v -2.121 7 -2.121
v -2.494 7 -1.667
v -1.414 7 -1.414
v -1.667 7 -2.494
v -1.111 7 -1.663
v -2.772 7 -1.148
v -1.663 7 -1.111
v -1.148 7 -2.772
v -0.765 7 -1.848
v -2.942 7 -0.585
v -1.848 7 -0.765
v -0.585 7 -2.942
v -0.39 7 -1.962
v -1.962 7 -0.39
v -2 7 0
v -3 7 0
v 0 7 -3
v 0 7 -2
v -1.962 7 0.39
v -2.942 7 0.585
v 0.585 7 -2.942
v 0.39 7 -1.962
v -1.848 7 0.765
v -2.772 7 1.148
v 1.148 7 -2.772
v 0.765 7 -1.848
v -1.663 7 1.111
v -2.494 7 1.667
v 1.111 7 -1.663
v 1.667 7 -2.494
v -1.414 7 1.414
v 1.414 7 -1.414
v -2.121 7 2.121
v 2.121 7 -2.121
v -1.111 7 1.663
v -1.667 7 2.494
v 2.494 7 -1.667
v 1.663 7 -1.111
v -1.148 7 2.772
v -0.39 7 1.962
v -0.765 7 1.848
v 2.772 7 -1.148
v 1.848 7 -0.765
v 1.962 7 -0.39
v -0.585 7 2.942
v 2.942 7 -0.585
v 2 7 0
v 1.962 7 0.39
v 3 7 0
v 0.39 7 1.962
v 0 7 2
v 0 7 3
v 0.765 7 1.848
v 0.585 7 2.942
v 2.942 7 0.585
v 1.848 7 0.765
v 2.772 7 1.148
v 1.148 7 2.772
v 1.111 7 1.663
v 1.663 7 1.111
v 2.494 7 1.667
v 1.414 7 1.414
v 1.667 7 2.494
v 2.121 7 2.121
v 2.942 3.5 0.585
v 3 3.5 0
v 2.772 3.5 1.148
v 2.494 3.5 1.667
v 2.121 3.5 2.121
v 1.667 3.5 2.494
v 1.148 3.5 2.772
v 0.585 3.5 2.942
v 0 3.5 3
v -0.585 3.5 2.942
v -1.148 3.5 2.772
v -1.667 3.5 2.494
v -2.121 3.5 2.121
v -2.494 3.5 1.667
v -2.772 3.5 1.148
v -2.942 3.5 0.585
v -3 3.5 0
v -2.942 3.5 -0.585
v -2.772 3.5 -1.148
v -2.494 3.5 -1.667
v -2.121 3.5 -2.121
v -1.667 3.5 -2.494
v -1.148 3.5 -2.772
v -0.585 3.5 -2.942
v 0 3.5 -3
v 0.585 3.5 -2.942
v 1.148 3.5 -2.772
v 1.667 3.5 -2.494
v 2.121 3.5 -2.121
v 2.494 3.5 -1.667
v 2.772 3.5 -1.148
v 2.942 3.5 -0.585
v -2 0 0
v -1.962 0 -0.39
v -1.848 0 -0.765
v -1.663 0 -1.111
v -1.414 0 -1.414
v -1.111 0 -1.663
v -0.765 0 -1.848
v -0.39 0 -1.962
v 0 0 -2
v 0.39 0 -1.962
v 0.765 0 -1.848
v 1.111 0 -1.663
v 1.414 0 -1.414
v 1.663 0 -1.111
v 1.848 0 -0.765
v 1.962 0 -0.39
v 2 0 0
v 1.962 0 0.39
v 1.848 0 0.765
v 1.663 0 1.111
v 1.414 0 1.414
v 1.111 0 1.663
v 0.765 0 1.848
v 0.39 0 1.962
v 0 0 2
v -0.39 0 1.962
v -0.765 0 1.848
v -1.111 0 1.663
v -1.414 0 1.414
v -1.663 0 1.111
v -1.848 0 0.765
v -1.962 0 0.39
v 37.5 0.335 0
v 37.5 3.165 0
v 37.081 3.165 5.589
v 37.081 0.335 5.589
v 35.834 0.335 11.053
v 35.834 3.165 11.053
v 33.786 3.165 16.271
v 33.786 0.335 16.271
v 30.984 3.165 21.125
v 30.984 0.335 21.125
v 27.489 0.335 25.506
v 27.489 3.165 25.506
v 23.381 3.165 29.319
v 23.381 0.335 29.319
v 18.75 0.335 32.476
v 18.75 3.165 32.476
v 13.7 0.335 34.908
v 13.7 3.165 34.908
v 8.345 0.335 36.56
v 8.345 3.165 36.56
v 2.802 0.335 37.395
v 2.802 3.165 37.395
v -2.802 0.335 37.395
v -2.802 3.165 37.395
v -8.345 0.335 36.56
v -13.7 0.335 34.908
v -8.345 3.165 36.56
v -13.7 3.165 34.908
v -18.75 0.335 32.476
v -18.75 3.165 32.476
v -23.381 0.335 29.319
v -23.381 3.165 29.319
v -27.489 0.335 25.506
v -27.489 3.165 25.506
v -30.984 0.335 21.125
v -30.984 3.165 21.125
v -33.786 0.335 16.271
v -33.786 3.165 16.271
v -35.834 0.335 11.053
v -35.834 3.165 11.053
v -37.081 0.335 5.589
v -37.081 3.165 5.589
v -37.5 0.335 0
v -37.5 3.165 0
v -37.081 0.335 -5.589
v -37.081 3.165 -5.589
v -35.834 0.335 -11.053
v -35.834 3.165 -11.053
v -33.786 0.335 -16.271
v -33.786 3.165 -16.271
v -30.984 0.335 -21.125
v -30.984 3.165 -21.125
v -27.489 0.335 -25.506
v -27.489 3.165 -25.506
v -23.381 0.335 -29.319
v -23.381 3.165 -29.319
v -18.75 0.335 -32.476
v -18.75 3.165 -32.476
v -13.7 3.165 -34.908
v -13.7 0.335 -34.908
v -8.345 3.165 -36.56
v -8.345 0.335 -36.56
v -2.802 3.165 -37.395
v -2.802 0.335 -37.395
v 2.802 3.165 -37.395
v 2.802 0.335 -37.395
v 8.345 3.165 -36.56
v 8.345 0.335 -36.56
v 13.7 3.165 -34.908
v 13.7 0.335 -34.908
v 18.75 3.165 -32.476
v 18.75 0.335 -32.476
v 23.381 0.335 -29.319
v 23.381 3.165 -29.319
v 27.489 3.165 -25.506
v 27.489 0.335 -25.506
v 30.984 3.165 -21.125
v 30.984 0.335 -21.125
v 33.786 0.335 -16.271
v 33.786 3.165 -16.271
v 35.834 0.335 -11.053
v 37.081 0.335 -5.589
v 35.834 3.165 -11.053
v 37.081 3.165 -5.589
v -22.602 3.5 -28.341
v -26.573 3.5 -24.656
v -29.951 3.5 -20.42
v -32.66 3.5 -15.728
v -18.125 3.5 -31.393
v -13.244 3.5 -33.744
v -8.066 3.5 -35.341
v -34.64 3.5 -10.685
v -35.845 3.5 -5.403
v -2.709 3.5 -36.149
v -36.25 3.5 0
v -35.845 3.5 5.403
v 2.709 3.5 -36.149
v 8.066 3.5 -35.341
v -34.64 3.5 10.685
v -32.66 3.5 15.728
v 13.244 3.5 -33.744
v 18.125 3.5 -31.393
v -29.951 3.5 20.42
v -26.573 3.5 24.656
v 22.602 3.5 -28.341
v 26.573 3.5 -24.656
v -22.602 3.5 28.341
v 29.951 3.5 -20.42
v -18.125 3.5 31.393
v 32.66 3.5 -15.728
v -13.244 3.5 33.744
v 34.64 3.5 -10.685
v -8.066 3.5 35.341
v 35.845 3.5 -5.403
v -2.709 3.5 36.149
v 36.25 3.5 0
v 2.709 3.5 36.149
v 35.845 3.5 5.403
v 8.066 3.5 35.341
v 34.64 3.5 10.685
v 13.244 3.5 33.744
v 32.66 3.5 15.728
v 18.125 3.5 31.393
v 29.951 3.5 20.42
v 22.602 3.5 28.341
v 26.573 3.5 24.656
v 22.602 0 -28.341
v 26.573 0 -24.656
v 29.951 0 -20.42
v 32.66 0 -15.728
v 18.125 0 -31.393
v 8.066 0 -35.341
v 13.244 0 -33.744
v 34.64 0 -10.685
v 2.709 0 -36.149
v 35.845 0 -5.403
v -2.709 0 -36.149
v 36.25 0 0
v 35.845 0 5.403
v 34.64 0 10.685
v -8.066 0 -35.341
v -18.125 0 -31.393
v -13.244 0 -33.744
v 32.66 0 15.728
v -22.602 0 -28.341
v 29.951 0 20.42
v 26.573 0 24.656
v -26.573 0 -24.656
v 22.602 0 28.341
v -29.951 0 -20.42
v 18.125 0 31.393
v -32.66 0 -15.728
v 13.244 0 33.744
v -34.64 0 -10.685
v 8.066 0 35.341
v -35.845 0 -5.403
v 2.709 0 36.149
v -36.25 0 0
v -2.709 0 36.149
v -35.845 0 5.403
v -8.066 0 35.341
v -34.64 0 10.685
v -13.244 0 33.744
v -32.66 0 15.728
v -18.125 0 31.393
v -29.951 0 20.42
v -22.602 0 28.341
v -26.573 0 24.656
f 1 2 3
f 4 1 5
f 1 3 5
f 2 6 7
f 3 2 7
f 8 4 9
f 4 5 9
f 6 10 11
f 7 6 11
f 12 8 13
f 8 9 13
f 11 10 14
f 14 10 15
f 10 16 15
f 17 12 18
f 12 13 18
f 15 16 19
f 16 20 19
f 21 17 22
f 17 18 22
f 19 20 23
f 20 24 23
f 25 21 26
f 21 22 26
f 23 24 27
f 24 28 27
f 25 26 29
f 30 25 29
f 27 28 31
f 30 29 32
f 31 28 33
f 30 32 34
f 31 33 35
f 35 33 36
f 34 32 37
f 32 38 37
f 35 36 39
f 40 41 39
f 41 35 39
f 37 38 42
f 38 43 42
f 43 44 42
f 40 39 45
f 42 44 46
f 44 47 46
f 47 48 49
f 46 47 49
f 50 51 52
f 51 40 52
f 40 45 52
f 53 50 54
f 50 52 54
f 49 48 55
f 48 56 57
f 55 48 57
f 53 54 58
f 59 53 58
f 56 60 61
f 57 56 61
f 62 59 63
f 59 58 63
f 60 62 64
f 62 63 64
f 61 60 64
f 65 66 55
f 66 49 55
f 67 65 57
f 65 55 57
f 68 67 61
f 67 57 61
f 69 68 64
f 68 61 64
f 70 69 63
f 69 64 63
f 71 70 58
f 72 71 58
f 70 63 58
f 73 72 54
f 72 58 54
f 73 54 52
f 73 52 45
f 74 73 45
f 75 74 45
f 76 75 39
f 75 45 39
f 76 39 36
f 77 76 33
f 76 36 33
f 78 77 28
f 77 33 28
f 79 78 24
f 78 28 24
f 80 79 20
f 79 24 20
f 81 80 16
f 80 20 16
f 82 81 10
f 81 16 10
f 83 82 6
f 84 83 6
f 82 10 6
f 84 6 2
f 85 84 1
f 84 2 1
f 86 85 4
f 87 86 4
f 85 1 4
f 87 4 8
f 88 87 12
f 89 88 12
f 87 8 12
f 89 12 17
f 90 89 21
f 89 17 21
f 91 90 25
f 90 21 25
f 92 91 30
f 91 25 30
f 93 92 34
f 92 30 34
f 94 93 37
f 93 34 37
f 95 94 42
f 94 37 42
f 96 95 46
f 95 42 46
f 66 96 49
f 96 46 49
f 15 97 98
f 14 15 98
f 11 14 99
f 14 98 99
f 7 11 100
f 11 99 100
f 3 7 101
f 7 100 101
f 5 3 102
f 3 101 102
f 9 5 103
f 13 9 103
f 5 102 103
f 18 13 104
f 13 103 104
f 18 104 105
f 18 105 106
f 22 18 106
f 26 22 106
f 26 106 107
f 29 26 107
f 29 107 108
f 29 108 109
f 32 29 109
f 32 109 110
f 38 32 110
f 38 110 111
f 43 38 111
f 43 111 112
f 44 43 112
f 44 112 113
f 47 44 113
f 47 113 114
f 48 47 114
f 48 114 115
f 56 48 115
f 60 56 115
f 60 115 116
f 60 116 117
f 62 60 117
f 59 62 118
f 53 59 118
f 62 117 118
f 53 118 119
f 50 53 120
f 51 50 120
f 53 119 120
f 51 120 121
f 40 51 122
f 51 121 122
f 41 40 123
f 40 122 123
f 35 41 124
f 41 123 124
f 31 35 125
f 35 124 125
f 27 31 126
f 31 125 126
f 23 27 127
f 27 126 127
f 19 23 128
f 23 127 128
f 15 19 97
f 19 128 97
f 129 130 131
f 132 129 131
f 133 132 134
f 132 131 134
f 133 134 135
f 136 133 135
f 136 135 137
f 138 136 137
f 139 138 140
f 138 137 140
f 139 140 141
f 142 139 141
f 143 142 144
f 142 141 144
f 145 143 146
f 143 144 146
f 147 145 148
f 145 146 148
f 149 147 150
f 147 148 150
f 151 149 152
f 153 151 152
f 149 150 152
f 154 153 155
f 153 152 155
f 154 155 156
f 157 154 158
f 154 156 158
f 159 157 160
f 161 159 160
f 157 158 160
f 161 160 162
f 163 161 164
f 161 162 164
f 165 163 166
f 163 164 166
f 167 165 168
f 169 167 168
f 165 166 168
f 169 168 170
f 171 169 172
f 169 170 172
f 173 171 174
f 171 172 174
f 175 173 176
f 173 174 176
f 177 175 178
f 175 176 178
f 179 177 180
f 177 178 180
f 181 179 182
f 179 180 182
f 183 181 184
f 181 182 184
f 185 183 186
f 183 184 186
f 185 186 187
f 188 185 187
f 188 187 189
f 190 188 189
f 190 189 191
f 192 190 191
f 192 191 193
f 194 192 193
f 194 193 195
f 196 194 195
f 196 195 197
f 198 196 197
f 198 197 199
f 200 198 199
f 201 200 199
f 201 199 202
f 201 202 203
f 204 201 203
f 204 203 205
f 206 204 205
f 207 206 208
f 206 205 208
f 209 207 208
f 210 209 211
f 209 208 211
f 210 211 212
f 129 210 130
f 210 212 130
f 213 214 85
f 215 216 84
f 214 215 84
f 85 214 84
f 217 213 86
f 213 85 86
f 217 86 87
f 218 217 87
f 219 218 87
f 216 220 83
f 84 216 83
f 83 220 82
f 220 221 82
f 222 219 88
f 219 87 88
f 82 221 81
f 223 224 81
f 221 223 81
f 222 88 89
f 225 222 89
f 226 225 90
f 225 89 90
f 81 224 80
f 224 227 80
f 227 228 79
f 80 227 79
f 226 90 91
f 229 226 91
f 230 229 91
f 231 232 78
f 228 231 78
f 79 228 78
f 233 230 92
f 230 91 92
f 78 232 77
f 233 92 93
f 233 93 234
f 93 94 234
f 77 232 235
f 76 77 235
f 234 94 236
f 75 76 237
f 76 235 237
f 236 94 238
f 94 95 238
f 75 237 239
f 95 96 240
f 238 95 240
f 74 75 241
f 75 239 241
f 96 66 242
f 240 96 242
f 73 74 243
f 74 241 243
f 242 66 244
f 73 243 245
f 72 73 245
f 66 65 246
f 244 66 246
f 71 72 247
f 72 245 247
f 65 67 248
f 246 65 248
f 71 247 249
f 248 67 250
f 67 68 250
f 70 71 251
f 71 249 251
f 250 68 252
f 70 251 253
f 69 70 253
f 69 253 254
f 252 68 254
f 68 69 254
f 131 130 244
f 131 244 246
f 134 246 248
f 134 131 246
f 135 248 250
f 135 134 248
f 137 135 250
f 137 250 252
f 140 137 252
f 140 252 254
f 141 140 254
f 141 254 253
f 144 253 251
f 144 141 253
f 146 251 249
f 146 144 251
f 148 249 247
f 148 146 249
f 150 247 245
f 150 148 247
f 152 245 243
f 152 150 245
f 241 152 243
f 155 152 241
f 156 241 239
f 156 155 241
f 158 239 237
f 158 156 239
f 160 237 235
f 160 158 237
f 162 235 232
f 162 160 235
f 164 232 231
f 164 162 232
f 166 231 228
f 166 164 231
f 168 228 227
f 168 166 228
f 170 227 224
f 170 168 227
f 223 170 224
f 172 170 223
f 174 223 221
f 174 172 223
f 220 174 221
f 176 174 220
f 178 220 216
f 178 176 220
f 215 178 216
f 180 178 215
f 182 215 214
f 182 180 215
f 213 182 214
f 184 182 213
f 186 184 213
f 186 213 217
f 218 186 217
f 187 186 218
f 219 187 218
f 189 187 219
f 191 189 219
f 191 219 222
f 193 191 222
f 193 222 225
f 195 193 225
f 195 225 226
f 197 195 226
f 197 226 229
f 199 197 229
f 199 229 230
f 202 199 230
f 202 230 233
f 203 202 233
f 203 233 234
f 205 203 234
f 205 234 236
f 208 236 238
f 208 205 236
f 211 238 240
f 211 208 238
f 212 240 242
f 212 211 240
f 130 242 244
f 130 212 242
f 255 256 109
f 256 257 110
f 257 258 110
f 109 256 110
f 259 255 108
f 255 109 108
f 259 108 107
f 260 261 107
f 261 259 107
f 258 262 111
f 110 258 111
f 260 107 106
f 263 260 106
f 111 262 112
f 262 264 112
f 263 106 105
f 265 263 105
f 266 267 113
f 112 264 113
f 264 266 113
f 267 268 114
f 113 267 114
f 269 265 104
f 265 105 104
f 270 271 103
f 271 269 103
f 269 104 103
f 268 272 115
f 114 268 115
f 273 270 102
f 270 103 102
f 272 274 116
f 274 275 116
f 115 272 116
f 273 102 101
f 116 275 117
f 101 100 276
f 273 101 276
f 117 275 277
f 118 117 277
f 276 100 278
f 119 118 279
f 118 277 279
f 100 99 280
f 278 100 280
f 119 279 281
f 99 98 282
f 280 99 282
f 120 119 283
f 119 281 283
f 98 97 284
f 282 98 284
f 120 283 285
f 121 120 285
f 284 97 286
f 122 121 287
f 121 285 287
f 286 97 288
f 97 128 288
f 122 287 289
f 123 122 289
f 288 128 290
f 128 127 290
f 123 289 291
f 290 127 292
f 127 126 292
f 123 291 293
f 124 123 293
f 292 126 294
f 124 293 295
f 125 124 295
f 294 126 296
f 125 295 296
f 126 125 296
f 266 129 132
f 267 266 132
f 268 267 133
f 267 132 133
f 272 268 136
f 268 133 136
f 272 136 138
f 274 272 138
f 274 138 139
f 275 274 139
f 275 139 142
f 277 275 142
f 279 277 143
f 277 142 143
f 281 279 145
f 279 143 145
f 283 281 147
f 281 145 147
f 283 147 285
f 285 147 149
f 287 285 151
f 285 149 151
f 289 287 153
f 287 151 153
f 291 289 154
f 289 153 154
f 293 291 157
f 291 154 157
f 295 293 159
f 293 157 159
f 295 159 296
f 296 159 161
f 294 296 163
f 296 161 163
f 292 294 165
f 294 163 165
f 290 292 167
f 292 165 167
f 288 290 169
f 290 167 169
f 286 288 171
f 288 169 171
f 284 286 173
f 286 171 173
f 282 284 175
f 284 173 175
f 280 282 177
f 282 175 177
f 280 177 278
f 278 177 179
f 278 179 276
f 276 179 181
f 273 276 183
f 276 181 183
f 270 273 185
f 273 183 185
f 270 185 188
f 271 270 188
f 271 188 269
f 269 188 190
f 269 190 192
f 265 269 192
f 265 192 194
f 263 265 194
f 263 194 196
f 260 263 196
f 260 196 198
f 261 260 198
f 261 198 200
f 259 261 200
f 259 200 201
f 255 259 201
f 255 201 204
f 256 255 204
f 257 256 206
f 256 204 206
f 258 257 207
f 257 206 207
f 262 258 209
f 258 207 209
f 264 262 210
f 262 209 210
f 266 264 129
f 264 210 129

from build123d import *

# Parameters (mm, degrees)
CHAMFER_1_SIZE           = 1.25
CHAMFER_1_SIZE2          = 0.334936491
SKETCH_2_R               = 2
CUT_EXTRUDE_3_DEPTH      = 1
CUT_EXTRUDE_3_DEPTH_BACK = 8
CHAMFER_2_SIZE           = 1.25
CHAMFER_2_SIZE2          = 0.334936491


with BuildPart() as part:
    # Эскиз1 → Повернуть2 (revolve)
    with BuildSketch(Plane.XY):
        Polygon((0, 0), (37.5, 0), (37.5, 3.5), (3, 3.5), (3, 7), (0, 7), align=None)
    revolve(axis=Axis((0, 7, 0), (0, -1, 0)))

    # Фаска1
    chamfer_1_edges = [part.edges().sort_by_distance(p)[0] for p in [
        (-37.5, 3.5, 0),
    ]]
    chamfer_1_side = [part.faces().sort_by_distance(p)[0] for p in [
        (-36.439339828, 3.5, 0),
    ]]
    chamfer(chamfer_1_edges, length=CHAMFER_1_SIZE, length2=CHAMFER_1_SIZE2, reference=chamfer_1_side[0])

    # Эскиз2 → Вырез-Вытянуть3 (cut, two sides)
    with BuildSketch(Plane(origin=(0, 0, 0), x_dir=(-1, 0, 0), z_dir=(0, -1, 0))) as cut_extrude_3_sk:
        Circle(SKETCH_2_R)
    extrude(amount=CUT_EXTRUDE_3_DEPTH, mode=Mode.SUBTRACT)
    extrude(cut_extrude_3_sk.sketch, amount=-CUT_EXTRUDE_3_DEPTH_BACK, mode=Mode.SUBTRACT)

    # Фаска2
    chamfer_2_edges = [part.edges().sort_by_distance(p)[0] for p in [
        (-37.5, 0, 0),
    ]]
    chamfer_2_side = [part.faces().sort_by_distance(p)[0] for p in [
        (-36.439339828, 0, 0),
    ]]
    chamfer(chamfer_2_edges, length=CHAMFER_2_SIZE, length2=CHAMFER_2_SIZE2, reference=chamfer_2_side[0])


solid = part.part
